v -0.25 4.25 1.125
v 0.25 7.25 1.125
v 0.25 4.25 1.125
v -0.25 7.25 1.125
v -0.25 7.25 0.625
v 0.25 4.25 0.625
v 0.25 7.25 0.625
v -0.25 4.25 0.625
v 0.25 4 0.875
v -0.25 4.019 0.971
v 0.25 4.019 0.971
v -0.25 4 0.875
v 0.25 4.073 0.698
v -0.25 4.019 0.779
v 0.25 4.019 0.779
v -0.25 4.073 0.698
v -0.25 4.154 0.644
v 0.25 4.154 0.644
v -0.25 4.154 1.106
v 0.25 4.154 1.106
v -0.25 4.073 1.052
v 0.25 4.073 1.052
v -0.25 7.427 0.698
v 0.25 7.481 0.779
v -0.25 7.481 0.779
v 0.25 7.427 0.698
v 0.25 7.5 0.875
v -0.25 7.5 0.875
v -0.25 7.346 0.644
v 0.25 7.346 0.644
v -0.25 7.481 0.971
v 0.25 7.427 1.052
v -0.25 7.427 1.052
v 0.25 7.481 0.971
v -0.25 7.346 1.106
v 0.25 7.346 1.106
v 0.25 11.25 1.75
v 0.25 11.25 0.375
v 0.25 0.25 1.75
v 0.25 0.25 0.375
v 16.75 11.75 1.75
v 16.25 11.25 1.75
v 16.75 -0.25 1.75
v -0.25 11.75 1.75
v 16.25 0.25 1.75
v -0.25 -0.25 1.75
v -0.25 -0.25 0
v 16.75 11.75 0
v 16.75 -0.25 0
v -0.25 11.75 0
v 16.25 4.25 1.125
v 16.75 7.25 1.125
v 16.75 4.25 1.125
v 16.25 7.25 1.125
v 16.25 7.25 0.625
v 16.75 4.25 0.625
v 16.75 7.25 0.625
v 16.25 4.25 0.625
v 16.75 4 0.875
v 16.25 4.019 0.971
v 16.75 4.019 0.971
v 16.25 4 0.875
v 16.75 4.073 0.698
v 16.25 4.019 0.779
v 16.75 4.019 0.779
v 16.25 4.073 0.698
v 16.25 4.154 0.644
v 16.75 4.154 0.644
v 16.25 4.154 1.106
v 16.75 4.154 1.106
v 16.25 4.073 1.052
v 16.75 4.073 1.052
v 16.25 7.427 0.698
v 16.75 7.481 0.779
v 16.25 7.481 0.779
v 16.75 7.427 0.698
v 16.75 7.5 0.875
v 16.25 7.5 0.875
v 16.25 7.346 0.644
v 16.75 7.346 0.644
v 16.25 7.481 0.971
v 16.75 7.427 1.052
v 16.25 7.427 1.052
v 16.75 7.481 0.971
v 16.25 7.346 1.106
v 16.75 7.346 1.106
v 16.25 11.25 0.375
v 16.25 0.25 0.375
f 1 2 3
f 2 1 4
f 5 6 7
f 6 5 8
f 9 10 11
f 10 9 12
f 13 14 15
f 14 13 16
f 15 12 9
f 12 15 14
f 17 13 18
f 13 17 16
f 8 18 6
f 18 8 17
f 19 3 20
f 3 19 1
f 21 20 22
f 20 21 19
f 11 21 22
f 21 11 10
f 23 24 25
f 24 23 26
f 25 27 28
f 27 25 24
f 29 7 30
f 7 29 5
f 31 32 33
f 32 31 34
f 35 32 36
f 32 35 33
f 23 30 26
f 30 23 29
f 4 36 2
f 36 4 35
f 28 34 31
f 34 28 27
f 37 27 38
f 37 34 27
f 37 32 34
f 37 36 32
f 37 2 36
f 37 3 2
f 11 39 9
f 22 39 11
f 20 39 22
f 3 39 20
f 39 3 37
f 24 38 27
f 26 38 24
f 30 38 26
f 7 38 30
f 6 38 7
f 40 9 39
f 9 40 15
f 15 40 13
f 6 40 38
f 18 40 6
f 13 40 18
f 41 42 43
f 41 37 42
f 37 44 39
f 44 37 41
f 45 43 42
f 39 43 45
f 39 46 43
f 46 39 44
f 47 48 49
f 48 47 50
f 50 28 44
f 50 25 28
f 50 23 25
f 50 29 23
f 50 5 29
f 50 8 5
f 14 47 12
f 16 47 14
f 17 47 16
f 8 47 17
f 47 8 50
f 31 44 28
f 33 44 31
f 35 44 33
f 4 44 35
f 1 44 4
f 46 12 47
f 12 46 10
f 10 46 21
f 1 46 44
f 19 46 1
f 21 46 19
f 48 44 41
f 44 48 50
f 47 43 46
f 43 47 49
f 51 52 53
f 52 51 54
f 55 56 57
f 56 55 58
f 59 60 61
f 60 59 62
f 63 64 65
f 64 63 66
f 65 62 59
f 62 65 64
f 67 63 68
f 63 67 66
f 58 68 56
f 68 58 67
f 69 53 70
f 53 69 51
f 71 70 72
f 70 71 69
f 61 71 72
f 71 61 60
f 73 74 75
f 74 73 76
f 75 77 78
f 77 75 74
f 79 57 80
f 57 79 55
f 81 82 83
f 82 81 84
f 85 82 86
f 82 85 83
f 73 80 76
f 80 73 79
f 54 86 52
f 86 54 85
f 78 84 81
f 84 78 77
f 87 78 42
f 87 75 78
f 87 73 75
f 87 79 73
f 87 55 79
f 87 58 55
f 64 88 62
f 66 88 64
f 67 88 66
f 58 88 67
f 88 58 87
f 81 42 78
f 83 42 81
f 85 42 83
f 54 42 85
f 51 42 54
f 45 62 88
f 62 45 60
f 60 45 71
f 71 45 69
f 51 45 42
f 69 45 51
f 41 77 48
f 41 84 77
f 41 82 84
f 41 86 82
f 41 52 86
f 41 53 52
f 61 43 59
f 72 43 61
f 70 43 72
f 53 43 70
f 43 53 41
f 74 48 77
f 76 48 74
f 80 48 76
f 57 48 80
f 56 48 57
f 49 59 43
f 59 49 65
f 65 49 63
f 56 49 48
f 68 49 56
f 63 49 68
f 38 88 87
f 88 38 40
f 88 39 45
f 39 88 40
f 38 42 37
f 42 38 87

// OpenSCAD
height = 1.75;
width = 11.5;
length = 16.5;
side_thickness = 1/2;
leather_thickness = 1/8;
base_thickness = 1/4 + leather_thickness;
handle_thickness = 1/2;
handle_length = 3;

cube([length, width, base_thickness], center=false);

module face_side()
{
    translate([-side_thickness/2, -side_thickness/2, 0])
    cube([length + side_thickness, side_thickness, height], center = false);
}

module handle_side()
{
    translate([-side_thickness/2, -side_thickness/2, 0])
    difference()
    {
        cube(
            [side_thickness, width + side_thickness, height],
            center=false);
        translate([0, (width + side_thickness) / 2, height /2])
        translate([-0.1, -handle_length / 2, -handle_thickness / 2])
        union()
        {
            cube([side_thickness + 0.2, handle_length, handle_thickness], center=false);
            translate([0, 0, handle_thickness/2])
            rotate([0, 90, 0])
            cylinder(h = side_thickness + 0.2, r = handle_thickness / 2, $fn=16); 
            translate([0, handle_length, handle_thickness/2])
            rotate([0, 90, 0])
            cylinder(h = side_thickness + 0.2, r = handle_thickness / 2, $fn=16); 
                
        }
    }
}

face_side();
mirror([0, 1, 0])
translate([0, -width, 0])
face_side();

handle_side();
mirror([1, 0, 0])
translate([-length, 0, 0])
handle_side();
